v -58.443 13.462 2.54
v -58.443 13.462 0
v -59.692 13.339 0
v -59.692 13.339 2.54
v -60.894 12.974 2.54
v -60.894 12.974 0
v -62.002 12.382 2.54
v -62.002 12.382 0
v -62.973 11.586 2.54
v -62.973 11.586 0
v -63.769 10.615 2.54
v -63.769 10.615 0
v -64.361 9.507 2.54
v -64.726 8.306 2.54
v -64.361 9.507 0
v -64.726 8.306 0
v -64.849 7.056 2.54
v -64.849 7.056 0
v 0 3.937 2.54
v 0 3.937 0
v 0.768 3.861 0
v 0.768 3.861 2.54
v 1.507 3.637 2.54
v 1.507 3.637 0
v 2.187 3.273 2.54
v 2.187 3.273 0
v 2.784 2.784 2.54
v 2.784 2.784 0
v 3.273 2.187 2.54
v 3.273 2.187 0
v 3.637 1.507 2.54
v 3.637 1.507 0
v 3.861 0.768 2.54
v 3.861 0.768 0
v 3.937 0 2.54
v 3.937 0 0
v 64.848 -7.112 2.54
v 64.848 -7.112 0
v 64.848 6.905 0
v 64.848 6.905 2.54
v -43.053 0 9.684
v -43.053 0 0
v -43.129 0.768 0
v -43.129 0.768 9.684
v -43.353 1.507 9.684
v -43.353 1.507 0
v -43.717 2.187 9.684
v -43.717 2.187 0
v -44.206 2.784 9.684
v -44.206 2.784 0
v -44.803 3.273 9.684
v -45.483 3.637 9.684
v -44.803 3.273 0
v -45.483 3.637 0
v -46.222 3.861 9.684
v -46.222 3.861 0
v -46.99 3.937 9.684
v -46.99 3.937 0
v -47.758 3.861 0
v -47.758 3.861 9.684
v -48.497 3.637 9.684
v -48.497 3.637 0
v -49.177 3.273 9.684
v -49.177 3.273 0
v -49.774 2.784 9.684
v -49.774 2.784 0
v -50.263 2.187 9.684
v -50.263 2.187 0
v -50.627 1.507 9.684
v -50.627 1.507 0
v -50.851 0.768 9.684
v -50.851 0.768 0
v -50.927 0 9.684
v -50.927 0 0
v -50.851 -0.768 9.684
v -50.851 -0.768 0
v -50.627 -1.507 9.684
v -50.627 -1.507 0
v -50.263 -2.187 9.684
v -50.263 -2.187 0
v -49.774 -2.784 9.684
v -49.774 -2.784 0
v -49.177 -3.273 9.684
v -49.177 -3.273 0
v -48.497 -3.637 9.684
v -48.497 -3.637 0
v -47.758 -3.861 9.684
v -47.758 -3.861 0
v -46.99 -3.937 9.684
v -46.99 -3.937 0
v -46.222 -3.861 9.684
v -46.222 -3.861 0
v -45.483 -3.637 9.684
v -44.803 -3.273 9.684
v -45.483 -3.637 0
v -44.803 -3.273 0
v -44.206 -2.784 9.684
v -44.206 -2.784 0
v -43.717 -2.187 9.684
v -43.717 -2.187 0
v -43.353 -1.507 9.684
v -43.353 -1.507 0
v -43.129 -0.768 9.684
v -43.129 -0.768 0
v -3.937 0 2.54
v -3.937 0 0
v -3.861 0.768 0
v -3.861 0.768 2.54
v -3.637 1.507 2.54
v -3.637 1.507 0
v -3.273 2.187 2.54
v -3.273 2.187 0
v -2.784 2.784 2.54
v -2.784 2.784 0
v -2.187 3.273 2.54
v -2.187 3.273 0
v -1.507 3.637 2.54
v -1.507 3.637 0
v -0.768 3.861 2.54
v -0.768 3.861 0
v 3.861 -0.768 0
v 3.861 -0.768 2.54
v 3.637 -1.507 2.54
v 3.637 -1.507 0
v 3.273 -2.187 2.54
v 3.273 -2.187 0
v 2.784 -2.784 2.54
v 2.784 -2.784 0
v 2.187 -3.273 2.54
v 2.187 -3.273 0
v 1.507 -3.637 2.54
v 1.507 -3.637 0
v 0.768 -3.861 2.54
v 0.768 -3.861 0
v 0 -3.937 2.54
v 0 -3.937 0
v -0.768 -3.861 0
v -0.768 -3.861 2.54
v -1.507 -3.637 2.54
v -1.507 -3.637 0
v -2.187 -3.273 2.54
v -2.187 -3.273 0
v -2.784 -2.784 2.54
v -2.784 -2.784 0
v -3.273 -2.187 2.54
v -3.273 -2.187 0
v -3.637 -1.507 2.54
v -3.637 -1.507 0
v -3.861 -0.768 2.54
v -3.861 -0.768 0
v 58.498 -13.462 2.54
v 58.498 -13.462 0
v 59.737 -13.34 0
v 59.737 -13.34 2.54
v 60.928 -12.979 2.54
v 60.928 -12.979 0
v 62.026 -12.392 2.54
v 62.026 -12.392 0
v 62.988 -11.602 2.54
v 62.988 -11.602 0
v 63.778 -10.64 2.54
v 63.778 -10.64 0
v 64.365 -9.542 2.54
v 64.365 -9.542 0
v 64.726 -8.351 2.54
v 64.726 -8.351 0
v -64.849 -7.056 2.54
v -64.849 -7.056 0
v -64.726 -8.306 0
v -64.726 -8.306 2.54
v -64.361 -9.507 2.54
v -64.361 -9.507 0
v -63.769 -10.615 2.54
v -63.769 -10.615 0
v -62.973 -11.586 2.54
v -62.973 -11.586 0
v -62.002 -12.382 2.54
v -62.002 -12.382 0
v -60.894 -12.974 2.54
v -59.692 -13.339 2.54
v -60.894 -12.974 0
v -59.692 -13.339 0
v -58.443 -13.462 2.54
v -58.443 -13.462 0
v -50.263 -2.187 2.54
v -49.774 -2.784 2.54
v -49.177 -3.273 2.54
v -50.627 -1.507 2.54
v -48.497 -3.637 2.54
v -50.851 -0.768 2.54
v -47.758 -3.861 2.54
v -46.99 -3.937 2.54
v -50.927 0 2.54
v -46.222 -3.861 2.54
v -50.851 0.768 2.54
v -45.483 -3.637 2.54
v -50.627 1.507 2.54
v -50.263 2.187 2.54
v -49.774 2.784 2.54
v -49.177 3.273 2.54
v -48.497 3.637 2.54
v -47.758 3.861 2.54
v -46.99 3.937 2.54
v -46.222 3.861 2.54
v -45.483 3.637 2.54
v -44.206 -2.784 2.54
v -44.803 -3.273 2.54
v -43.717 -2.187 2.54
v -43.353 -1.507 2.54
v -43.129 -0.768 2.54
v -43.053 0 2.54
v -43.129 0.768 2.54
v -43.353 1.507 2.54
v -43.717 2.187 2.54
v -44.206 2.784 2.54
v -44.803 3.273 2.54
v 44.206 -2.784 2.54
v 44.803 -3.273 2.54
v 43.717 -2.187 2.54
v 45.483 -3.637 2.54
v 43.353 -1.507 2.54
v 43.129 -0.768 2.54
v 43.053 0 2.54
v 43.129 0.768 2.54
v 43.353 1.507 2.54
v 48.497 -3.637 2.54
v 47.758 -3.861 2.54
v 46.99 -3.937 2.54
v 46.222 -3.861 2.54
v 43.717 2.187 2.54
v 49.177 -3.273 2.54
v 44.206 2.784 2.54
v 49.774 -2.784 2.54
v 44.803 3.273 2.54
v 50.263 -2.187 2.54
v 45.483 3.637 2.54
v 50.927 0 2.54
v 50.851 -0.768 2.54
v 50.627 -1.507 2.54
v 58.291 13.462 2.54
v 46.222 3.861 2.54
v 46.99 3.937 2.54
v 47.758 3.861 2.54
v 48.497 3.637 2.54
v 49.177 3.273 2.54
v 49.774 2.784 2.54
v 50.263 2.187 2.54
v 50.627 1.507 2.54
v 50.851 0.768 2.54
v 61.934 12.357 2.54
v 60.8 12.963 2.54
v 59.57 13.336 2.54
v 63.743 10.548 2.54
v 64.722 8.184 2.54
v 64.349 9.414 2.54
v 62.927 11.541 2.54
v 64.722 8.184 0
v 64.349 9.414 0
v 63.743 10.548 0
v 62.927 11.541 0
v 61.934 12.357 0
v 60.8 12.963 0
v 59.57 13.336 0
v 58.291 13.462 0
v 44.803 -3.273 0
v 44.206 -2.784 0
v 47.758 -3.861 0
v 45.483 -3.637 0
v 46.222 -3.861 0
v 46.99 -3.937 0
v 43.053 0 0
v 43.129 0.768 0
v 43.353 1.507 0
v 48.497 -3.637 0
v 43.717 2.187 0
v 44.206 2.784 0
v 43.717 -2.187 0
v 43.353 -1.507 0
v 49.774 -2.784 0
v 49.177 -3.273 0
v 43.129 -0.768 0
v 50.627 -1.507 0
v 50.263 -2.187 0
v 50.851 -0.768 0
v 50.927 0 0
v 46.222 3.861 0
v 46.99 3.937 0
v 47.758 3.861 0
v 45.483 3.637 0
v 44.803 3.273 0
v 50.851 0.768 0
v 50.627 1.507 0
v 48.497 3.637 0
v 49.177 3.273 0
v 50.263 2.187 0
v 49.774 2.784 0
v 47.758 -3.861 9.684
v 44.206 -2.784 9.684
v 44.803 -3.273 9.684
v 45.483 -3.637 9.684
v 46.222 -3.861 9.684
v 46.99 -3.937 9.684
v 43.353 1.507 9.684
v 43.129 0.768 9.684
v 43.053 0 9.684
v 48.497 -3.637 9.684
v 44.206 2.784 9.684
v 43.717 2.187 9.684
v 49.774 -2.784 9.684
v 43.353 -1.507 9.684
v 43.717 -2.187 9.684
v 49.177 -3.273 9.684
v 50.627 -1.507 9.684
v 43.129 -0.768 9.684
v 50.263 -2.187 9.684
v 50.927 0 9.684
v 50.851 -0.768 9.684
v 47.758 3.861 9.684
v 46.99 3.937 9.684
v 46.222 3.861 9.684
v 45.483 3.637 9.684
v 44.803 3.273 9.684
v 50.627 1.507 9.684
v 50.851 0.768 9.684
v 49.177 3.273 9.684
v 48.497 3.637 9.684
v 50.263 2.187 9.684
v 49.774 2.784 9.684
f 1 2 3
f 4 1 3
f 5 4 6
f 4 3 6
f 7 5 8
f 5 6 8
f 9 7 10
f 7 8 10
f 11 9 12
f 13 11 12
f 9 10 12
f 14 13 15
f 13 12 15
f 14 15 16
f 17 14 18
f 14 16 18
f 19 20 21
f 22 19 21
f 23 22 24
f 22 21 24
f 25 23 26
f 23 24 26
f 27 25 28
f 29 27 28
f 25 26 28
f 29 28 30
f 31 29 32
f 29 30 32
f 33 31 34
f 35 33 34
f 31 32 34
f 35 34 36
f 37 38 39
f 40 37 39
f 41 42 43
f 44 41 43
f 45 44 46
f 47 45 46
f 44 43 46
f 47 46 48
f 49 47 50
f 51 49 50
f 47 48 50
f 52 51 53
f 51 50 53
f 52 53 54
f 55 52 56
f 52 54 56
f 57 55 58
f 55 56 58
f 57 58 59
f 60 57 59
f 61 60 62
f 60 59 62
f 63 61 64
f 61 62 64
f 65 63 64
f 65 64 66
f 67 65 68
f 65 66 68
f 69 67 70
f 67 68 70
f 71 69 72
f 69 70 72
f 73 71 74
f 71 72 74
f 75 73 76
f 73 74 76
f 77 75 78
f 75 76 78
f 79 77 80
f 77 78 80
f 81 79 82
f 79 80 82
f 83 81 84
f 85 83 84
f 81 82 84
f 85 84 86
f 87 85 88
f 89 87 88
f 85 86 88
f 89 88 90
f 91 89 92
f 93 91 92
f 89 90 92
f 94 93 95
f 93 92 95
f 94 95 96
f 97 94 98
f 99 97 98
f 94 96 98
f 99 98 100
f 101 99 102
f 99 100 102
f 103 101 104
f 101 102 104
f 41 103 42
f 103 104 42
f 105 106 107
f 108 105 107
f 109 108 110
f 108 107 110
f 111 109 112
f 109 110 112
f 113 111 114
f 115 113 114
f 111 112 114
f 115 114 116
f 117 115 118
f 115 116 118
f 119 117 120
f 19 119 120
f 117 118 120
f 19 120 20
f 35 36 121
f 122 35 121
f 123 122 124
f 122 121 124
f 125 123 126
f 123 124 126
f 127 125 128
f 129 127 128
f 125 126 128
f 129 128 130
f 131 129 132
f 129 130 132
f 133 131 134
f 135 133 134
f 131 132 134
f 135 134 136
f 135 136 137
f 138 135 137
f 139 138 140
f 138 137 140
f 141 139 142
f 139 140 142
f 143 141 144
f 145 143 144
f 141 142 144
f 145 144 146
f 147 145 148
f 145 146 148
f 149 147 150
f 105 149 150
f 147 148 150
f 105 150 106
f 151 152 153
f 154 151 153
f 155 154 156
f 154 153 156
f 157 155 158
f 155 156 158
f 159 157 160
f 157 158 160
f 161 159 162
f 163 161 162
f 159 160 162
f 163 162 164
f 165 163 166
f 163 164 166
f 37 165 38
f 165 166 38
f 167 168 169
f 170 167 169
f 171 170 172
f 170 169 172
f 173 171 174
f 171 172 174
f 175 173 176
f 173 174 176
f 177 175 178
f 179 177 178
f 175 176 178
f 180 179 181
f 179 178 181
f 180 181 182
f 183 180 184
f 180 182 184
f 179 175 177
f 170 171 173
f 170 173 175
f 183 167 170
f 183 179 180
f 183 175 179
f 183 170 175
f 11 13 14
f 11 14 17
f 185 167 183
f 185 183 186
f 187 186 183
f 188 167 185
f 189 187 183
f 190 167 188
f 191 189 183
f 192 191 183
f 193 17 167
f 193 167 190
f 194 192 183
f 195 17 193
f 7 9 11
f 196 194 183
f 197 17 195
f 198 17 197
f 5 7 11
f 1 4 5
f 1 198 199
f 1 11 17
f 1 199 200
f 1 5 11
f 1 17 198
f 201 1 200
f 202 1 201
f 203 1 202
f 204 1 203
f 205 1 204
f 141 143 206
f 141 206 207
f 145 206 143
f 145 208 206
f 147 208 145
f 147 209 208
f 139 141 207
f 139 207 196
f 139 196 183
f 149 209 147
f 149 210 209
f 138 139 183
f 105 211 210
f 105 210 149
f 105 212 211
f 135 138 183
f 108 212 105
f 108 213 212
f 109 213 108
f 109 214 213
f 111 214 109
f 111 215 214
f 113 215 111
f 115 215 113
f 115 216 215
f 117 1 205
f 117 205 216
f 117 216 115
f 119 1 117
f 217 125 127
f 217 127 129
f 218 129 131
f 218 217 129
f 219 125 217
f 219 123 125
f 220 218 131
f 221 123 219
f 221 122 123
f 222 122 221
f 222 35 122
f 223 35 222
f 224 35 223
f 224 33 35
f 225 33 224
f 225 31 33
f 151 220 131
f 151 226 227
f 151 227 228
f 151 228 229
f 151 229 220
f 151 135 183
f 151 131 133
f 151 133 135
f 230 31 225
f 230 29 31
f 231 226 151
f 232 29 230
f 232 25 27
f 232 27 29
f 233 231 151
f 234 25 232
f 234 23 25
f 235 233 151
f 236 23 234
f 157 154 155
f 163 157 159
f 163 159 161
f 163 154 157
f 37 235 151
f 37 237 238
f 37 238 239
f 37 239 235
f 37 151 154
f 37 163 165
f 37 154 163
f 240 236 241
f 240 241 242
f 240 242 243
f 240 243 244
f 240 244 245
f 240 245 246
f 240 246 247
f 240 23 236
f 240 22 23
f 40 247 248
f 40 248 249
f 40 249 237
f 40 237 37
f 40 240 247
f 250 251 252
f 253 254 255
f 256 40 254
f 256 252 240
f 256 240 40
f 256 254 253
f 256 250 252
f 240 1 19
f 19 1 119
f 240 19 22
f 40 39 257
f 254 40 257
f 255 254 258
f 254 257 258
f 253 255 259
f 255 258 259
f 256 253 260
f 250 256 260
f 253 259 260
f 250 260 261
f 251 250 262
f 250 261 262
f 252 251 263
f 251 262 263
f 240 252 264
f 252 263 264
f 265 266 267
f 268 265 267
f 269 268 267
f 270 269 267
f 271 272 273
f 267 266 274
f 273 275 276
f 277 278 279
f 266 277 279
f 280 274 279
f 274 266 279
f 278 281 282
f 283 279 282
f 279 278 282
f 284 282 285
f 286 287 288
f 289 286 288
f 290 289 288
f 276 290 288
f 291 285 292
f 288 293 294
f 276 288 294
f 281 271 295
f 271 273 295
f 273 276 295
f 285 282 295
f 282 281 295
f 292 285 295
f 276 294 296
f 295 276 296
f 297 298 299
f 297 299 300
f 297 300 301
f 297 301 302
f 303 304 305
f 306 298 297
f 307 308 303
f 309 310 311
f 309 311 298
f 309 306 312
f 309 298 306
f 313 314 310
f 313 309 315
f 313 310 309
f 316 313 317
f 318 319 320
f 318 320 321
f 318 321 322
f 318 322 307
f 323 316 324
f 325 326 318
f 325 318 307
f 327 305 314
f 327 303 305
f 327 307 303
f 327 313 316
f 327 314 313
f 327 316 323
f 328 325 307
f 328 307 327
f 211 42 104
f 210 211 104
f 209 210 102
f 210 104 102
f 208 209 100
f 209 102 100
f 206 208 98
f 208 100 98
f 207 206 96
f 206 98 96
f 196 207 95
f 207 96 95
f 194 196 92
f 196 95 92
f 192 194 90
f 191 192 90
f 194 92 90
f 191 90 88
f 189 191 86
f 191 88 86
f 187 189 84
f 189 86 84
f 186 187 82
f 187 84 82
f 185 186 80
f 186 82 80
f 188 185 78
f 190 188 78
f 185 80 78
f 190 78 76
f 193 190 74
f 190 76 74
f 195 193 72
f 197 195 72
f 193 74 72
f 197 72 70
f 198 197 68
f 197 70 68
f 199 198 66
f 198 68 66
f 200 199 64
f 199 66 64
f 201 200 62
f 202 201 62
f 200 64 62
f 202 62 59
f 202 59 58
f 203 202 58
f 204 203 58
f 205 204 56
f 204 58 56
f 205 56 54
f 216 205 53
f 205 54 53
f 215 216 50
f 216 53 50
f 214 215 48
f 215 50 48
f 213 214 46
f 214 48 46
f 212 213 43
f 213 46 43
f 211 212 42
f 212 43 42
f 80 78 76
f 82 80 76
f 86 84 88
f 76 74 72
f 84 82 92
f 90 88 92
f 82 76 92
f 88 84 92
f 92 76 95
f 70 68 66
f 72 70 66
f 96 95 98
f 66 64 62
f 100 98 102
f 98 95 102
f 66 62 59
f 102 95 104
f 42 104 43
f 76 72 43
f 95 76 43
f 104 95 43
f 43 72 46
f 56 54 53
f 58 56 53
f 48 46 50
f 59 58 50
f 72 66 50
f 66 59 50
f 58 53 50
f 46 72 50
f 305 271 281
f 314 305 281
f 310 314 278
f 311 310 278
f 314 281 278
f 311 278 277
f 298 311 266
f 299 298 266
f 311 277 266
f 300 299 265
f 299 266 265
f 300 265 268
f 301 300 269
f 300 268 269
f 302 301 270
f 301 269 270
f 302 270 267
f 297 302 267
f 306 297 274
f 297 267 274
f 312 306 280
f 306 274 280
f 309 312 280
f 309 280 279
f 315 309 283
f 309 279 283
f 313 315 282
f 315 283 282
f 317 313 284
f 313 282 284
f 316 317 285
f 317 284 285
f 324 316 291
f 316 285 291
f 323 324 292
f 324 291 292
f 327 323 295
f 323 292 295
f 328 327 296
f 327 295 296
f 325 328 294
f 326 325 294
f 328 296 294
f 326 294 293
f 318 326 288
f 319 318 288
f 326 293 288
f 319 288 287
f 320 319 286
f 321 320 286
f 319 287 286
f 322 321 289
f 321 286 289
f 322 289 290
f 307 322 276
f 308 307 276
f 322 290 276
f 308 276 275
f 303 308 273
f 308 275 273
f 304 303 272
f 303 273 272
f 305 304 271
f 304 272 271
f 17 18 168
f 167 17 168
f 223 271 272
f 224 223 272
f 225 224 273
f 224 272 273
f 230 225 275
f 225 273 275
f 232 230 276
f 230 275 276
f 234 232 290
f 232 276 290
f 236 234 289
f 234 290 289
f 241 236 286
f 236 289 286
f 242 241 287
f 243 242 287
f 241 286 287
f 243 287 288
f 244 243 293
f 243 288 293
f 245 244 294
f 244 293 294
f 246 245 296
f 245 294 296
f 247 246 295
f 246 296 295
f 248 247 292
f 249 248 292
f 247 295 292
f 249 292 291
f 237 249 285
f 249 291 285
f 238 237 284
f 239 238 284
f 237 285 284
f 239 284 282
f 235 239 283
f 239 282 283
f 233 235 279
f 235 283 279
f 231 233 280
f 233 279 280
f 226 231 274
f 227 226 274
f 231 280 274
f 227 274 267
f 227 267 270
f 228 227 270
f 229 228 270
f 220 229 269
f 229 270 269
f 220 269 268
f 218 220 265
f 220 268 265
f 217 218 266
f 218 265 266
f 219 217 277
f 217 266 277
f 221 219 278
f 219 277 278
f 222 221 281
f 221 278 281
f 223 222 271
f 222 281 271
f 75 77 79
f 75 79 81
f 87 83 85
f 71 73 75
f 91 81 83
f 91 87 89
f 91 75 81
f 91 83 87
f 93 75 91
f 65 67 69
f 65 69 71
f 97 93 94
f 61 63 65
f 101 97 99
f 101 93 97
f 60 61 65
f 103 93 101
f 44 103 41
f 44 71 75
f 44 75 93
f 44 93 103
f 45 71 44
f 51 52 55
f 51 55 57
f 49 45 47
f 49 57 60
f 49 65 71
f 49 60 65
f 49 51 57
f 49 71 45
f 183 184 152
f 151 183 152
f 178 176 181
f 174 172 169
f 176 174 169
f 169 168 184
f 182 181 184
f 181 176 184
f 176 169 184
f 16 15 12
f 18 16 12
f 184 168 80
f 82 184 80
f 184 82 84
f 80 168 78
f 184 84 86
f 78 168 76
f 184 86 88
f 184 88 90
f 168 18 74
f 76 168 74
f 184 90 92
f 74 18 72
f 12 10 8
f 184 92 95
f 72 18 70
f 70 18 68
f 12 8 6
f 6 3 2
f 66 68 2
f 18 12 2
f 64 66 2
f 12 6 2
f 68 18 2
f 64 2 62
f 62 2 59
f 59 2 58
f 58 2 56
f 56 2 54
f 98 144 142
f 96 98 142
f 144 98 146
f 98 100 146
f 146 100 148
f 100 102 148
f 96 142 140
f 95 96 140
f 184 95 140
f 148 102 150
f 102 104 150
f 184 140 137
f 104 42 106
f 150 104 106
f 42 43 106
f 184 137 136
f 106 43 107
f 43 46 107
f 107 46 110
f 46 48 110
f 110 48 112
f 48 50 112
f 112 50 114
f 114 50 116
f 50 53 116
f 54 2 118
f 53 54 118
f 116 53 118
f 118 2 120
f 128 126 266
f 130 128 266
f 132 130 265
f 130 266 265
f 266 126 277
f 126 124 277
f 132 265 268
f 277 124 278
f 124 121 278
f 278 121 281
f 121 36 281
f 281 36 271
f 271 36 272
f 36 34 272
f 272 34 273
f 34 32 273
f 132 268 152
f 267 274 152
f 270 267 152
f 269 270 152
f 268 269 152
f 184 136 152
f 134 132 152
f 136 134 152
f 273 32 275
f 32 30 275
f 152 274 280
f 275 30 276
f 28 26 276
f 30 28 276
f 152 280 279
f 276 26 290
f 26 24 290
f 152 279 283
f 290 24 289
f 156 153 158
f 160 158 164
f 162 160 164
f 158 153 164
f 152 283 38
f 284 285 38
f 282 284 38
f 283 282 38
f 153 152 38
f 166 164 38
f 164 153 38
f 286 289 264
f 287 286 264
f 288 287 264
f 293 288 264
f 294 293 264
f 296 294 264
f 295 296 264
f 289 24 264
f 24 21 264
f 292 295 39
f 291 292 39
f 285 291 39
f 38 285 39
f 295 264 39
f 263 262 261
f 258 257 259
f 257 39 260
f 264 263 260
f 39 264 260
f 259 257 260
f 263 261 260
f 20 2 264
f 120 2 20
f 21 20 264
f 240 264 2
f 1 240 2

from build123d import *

# Parameters (mm, degrees)
F1_DEPTH = 9.684
F2_DEPTH = 2.54


with BuildPart() as f1:
    # F0 (on Top) → F1 (new body)
    with BuildSketch(Plane.XY):
        with BuildLine():
            ThreePointArc((50.927, 0), (46.99, 3.937), (43.053, 0))
            ThreePointArc((43.053, 0), (46.99, -3.937), (50.927, 0))
        make_face()
    extrude(amount=F1_DEPTH)


with BuildPart() as f1b:
    # F0 (on Top) → F1, piece 2 (new body)
    with BuildSketch(Plane.XY):
        with BuildLine():
            ThreePointArc((-50.927, 0), (-46.99, -3.937), (-43.053, 0))
            ThreePointArc((-43.053, 0), (-46.99, 3.937), (-50.927, 0))
        make_face()
    extrude(amount=F1_DEPTH)


with BuildPart() as f2:
    # F0 (on Top) → F2 (new body)
    with BuildSketch(Plane.XY):
        with BuildLine():
            ThreePointArc((-3.937, 0), (-2.7838793975, 2.7838793975), (0, 3.937))
            Line((0, 3.937), (0, 13.462))
            Line((0, 13.462), (-58.4426107049, 13.462))
            ThreePointArc((-58.4426107049, 13.462), (-62.9725095854, 11.5856544475), (-64.8488551378, 7.0557555671))
            Line((-64.8488551378, 7.0557555671), (-64.8488551378, 0))
            Line((-64.8488551378, 0), (-50.927, 0))
            ThreePointArc((-50.927, 0), (-46.99, 3.937), (-43.053, 0))
            Line((-43.053, 0), (-3.937, 0))
        make_face()
        with BuildLine():
            Line((0, -13.462), (0, -3.937))
            ThreePointArc((0, -3.937), (-2.7838793975, -2.7838793975), (-3.937, 0))
            Line((-3.937, 0), (-43.053, 0))
            ThreePointArc((-43.053, 0), (-46.99, -3.937), (-50.927, 0))
            Line((-50.927, 0), (-64.8488551378, 0))
            Line((-64.8488551378, 0), (-64.8488551378, -7.0557555671))
            ThreePointArc((-64.8488551378, -7.0557555671), (-62.9725095854, -11.5856544475), (-58.4426107049, -13.462))
            Line((-58.4426107049, -13.462), (0, -13.462))
        make_face()
        with BuildLine():
            ThreePointArc((0, 3.937), (2.7838793975, 2.7838793975), (3.937, 0))
            ThreePointArc((3.937, 0), (2.7838793975, -2.7838793975), (0, -3.937))
            Line((0, -3.937), (0, -13.462))
            Line((0, -13.462), (58.4979908705, -13.462))
            ThreePointArc((58.4979908705, -13.462), (62.988118931, -11.6021280605), (64.8479908705, -7.112))
            Line((64.8479908705, -7.112), (64.8479908705, 6.9048068042))
            ThreePointArc((64.8479908705, 6.9048068042), (62.927433449, 11.5414425785), (58.2907976747, 13.462))
            Line((58.2907976747, 13.462), (0, 13.462))
            Line((0, 13.462), (0, 3.937))
        make_face()
        with BuildLine():
            ThreePointArc((50.927, 0), (46.99, -3.937), (43.053, 0))
            ThreePointArc((43.053, 0), (46.99, 3.937), (50.927, 0))
        make_face(mode=Mode.SUBTRACT)
    extrude(amount=F2_DEPTH)


solid = Compound([f1.part, f1b.part, f2.part])
